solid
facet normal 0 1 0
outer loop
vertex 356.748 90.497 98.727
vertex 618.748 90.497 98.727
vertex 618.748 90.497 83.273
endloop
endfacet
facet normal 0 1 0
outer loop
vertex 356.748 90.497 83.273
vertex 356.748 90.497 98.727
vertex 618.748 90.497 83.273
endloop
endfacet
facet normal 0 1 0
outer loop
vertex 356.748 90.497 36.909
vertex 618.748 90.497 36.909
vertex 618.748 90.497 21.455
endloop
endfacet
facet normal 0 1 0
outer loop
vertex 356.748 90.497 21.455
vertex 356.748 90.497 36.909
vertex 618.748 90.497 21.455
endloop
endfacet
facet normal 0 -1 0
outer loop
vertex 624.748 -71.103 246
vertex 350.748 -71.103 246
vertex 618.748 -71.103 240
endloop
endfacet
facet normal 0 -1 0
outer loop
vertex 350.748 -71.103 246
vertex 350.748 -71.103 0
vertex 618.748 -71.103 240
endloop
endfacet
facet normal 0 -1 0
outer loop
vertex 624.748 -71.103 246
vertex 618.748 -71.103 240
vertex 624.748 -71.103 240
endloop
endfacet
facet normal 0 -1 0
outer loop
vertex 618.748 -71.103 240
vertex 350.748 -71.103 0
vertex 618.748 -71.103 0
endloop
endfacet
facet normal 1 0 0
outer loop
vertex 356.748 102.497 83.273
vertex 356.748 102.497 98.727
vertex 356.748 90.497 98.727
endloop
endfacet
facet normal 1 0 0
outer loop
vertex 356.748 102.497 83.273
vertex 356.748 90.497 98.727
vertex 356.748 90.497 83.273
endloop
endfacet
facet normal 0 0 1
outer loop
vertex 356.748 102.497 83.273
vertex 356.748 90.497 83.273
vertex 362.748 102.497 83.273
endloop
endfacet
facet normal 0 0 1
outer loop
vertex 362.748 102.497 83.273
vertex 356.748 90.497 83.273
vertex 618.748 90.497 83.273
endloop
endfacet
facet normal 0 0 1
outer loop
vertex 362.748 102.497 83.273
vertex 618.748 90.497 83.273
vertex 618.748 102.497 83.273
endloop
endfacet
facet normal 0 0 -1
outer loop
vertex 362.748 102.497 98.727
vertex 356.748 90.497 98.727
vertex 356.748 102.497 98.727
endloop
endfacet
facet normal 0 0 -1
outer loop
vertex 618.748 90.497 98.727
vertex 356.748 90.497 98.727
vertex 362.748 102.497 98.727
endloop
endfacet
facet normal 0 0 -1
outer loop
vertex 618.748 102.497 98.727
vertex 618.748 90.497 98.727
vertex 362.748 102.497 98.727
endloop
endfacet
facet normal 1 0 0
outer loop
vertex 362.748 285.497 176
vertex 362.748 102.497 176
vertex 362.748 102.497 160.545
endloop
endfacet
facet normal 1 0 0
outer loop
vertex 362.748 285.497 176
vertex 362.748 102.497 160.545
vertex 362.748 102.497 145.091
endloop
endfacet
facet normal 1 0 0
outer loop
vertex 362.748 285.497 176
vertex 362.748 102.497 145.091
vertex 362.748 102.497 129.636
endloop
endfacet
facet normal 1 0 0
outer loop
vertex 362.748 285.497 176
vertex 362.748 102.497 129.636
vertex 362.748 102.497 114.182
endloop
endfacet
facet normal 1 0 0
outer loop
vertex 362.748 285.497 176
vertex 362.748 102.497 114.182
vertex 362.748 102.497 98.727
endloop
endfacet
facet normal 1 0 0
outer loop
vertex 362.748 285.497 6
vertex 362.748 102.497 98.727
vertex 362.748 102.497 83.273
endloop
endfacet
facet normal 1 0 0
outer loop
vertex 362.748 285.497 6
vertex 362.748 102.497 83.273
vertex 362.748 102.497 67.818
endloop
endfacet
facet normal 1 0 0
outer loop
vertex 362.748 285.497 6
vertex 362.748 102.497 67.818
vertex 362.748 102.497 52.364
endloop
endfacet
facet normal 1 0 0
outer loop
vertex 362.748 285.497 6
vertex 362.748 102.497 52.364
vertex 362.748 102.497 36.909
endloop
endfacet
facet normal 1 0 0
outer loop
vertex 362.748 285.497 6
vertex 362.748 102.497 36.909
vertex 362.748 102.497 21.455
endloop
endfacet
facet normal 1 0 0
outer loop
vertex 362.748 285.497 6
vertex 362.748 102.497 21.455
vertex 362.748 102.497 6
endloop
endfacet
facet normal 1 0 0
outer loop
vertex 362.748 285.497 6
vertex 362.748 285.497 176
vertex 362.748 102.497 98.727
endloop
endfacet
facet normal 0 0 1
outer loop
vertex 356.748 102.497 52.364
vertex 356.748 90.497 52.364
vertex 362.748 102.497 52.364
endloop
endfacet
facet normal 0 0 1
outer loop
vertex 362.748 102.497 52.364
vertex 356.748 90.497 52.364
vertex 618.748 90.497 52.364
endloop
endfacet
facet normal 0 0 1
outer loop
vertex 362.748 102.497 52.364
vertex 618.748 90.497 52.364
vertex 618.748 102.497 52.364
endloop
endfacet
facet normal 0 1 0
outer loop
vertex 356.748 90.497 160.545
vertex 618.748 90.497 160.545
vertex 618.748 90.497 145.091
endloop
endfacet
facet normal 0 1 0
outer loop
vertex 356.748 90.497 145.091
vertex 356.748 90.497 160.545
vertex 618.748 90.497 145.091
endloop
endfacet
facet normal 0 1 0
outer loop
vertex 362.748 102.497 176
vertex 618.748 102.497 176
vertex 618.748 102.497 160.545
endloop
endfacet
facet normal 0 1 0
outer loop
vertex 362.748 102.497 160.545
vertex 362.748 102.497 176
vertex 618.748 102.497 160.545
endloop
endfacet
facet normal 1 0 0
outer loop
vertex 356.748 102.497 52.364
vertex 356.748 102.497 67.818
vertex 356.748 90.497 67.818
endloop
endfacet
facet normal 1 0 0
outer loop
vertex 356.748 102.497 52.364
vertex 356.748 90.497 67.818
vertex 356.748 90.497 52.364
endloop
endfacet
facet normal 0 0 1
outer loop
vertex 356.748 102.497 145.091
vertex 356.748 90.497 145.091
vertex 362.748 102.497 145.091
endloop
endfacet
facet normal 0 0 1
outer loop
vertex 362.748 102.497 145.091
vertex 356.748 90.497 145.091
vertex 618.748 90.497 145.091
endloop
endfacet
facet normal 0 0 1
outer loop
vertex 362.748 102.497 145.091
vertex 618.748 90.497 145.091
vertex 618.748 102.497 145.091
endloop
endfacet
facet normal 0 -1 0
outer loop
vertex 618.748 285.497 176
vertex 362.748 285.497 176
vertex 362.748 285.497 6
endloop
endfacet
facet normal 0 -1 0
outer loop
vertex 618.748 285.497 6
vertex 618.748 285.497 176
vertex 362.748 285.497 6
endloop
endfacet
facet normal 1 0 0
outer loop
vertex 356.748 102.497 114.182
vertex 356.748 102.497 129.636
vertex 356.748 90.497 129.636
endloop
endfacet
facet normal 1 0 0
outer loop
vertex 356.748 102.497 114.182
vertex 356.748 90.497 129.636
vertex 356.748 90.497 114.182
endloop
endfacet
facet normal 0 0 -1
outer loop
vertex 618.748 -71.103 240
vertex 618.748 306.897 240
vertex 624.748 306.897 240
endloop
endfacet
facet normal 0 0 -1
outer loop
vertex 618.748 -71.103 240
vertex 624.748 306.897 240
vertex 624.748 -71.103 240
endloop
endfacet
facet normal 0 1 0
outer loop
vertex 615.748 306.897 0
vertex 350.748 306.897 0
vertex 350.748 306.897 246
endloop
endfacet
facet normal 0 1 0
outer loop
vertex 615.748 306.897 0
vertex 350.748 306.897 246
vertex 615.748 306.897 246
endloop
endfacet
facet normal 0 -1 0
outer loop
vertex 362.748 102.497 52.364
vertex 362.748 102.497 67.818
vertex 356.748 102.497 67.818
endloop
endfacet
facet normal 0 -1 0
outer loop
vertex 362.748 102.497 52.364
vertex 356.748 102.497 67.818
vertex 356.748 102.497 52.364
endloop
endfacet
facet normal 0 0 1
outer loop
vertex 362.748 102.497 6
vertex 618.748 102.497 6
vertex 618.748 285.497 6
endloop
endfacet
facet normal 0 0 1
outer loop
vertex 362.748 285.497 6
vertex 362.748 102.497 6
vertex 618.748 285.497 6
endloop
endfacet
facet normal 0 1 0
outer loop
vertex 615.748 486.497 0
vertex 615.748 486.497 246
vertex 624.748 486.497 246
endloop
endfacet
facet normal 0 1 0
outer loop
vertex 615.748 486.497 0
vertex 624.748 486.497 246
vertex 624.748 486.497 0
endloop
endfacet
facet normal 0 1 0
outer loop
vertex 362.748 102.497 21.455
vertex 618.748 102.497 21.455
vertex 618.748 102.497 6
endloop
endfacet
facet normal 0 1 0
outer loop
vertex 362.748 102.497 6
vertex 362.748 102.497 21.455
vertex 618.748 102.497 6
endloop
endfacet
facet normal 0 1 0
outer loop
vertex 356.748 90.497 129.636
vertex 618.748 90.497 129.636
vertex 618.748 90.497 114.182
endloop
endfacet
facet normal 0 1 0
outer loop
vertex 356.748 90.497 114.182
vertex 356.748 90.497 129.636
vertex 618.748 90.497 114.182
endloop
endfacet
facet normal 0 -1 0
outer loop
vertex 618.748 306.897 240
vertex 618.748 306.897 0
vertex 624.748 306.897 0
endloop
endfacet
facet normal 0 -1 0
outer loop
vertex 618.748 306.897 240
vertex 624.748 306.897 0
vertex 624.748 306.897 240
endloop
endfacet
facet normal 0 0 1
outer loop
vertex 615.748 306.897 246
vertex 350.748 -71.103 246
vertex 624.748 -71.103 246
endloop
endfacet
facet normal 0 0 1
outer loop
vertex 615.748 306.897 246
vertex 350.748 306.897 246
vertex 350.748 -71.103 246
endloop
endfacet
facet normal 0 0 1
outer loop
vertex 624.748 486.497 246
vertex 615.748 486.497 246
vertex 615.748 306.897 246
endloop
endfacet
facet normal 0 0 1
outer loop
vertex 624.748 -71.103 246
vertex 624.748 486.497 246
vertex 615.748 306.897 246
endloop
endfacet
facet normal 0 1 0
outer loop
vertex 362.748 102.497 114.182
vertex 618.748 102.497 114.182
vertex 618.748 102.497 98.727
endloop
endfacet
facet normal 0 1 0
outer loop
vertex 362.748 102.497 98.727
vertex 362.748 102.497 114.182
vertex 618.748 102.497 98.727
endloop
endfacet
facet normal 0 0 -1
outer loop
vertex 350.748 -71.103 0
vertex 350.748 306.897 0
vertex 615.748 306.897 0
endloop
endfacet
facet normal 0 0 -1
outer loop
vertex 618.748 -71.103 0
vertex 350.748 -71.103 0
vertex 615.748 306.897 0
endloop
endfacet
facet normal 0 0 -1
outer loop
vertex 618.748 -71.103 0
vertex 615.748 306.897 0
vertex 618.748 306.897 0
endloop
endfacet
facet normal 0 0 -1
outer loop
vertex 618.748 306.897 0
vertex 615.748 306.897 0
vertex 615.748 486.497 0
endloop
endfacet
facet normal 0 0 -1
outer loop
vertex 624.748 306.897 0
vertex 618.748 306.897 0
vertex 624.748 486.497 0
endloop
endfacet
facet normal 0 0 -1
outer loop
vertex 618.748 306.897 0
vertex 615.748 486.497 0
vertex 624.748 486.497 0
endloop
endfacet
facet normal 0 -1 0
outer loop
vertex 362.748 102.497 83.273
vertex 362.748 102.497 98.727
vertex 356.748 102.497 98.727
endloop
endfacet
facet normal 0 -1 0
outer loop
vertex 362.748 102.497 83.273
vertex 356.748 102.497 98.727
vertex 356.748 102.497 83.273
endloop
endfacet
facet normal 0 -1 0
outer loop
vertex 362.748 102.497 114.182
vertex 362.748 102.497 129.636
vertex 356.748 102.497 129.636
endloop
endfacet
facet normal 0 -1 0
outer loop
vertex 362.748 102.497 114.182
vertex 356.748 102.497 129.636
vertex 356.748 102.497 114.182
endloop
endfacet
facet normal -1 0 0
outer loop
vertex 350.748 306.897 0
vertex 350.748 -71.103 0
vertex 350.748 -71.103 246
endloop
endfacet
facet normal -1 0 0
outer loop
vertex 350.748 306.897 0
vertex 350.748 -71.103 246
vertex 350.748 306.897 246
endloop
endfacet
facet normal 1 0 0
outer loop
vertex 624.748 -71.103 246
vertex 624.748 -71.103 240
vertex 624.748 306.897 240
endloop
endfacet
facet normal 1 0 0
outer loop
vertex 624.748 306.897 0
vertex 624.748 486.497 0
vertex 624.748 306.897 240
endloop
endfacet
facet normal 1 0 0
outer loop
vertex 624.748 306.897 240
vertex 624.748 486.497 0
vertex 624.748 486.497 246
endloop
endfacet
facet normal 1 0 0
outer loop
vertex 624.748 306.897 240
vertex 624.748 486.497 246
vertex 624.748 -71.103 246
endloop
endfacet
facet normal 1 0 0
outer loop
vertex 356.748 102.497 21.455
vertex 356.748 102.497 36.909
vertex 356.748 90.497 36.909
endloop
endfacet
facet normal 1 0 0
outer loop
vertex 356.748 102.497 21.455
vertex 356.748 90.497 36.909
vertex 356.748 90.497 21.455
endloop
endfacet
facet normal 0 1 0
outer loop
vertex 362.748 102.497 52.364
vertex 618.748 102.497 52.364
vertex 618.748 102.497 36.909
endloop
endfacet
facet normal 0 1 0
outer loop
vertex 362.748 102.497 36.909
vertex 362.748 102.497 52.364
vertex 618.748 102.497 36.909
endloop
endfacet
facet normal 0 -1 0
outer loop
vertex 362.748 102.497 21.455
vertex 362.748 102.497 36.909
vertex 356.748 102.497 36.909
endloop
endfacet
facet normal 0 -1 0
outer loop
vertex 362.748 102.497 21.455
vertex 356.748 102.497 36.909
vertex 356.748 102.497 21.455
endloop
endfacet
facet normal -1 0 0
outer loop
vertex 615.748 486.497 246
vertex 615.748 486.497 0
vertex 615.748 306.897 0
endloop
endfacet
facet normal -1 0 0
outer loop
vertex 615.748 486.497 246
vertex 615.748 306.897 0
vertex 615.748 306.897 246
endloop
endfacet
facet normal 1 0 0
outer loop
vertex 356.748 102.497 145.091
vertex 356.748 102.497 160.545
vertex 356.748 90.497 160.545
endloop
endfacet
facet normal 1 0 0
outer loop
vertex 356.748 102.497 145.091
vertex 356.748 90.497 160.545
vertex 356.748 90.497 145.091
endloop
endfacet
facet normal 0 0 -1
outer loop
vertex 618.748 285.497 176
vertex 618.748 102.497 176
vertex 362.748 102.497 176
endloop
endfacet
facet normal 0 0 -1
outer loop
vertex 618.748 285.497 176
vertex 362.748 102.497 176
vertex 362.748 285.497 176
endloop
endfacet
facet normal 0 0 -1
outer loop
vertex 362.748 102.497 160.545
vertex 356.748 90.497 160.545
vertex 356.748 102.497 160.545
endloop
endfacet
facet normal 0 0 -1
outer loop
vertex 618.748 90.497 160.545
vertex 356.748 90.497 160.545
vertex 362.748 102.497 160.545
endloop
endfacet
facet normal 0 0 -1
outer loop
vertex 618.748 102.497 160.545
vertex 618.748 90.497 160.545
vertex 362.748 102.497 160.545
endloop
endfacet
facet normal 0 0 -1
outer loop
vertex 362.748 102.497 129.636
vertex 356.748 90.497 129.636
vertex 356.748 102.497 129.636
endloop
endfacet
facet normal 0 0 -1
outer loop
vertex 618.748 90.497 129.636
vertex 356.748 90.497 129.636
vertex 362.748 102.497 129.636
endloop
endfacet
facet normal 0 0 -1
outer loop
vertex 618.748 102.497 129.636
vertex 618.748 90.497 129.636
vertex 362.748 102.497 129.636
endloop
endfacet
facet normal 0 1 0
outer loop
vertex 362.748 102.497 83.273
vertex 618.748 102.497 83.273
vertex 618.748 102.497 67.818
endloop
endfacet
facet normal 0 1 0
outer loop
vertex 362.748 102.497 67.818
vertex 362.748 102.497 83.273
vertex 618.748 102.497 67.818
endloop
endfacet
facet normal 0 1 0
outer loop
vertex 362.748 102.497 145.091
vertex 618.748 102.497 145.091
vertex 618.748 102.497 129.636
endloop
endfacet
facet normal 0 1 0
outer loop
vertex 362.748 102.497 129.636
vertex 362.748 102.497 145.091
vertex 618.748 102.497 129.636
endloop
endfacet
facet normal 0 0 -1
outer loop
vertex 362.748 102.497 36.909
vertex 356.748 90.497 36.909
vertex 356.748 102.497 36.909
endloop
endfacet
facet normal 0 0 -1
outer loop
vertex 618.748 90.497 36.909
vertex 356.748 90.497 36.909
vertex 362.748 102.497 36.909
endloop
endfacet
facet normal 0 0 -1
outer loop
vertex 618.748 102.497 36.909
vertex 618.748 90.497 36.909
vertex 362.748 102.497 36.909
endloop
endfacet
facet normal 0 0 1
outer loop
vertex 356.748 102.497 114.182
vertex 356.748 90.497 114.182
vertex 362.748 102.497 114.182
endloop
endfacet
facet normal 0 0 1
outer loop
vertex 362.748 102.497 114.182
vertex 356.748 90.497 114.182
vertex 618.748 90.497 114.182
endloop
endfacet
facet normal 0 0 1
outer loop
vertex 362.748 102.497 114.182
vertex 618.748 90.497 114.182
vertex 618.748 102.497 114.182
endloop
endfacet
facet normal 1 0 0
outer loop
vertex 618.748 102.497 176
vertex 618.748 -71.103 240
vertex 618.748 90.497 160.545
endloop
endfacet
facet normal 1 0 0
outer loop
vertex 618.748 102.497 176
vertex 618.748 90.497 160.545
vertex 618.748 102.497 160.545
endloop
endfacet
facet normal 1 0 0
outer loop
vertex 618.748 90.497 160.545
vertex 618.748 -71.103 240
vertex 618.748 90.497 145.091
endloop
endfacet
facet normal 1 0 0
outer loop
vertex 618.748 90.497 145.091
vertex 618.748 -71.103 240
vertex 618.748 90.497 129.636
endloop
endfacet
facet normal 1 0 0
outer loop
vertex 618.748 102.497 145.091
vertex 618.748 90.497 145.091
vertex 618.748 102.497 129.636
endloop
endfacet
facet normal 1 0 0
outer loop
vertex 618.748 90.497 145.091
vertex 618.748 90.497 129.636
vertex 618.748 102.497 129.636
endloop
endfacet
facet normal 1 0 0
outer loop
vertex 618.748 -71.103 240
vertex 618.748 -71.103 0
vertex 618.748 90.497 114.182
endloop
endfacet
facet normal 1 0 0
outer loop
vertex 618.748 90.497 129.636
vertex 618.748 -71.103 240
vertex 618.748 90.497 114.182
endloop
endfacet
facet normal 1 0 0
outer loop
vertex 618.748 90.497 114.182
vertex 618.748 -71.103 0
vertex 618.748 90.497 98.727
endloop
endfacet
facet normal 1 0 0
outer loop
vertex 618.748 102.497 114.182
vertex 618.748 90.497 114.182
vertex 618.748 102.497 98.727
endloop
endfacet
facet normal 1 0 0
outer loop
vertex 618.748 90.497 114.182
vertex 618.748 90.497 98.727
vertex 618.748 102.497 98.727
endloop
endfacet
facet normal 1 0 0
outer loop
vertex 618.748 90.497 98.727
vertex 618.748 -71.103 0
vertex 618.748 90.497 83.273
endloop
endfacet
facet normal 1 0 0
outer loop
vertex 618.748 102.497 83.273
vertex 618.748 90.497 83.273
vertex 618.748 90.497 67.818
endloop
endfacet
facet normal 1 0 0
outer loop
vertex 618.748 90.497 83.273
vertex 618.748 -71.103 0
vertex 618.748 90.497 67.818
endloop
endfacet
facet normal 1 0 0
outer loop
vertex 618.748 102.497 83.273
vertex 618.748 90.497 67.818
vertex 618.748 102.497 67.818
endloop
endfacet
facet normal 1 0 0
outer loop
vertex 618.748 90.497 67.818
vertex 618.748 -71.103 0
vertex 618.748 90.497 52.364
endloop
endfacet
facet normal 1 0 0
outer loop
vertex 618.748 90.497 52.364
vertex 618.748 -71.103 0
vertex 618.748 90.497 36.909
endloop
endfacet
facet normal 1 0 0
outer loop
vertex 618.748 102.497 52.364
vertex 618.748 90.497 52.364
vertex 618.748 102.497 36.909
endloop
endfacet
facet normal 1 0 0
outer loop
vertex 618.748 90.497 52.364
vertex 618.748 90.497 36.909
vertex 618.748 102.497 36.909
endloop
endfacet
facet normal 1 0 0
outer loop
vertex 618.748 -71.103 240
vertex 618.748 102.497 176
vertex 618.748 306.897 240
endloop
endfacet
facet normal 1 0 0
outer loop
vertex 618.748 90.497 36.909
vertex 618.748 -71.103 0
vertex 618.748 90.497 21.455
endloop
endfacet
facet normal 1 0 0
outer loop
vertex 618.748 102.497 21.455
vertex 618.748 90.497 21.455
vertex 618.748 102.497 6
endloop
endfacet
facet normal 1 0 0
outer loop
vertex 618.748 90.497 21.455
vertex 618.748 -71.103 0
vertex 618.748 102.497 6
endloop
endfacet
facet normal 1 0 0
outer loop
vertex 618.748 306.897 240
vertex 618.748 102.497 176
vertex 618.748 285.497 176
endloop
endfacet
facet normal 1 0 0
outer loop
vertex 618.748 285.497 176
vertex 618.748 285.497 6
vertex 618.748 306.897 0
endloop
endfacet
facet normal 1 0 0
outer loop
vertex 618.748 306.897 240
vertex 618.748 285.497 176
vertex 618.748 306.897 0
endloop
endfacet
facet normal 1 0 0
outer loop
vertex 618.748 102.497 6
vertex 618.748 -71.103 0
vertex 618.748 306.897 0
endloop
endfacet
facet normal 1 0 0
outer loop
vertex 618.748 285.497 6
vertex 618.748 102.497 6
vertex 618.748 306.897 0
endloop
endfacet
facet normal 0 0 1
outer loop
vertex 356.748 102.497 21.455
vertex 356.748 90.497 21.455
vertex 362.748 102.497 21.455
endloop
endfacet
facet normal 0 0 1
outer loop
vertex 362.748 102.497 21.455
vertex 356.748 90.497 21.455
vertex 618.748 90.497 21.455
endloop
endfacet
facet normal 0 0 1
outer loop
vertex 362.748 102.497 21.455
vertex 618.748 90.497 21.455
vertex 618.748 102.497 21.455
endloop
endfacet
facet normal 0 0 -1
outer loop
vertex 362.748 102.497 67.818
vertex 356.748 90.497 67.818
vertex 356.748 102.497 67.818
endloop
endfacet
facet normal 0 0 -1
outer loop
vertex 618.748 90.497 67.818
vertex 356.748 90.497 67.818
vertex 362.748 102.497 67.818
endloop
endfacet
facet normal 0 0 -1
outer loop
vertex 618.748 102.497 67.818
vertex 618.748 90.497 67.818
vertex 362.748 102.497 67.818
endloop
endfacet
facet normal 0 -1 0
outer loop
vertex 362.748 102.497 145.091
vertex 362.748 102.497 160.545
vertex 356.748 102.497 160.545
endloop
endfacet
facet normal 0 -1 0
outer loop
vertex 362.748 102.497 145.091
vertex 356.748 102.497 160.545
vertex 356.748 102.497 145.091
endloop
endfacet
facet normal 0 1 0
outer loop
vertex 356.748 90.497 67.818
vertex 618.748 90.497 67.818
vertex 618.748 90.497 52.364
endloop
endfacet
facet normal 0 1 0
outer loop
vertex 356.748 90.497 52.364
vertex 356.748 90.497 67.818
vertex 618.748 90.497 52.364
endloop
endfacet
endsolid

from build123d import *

# Parameters (mm, degrees)
SKETCH_1_W             = 268
SKETCH_1_H             = 378
EXTRUDE_1_DEPTH        = 246
SKETCH_2_W             = 170
SKETCH_2_H             = 183
CUT_EXTRUDE_1_DEPTH    = 256
EXTRUDE_4_DEPTH        = 6
EXTRUDE_4_DEPTH_BACK   = 3
SKETCH_8_W             = 15.454545454
SKETCH_8_H             = 12
CUT_EXTRUDE_2_DEPTH    = 262
PATTERN_LINEAR_1_COUNT = 5
PATTERN_LINEAR_1_PITCH = 30.909090909


with BuildPart() as part:
    # Эскиз1 → Бобышка-Вытянуть1 (new body)
    with BuildSketch(Plane.XY):
        with Locations((484.747616564, 117.897162102)):
            Rectangle(SKETCH_1_W, SKETCH_1_H)
    extrude(amount=EXTRUDE_1_DEPTH)

    # Эскиз2 → Вырез-Вытянуть1 (cut)
    with BuildSketch(Plane(origin=(618.747616564, 0, 0), x_dir=(0, 0, -1), z_dir=(1, 0, 0))):
        with Locations((-91, 193.997162102)):
            Rectangle(SKETCH_2_W, SKETCH_2_H)
    extrude(amount=-CUT_EXTRUDE_1_DEPTH, mode=Mode.SUBTRACT)

    # Эскиз7 → Бобышка-Вытянуть4 (add, two sides: drawn at the far end of the back side and taken through both)
    with BuildSketch(Plane(origin=(618.747616564, 0, 0), x_dir=(0, 0, -1), z_dir=(1, 0, 0)).offset(-EXTRUDE_4_DEPTH_BACK)):
        Polygon((-240, -71.102837898), (-246, -71.102837898), (-246, 486.497162102), (0, 486.497162102), (0, 306.897162102), (-240, 306.897162102), align=None)
    extrude(amount=EXTRUDE_4_DEPTH + EXTRUDE_4_DEPTH_BACK)

    # Эскиз8 → Вырез-Вытянуть2 (cut)
    with BuildSketch(Plane(origin=(618.747616564, 0, 0), x_dir=(0, 0, -1), z_dir=(1, 0, 0))):
        with Locations((-152.818181818, 96.497162102)):
            Rectangle(SKETCH_8_W, SKETCH_8_H)
    cut_extrude_2 = extrude(amount=-CUT_EXTRUDE_2_DEPTH, mode=Mode.SUBTRACT)

    # Линейный массив1: Вырез-Вытянуть2 ×5
    with Locations(*[(0, 0, -i * PATTERN_LINEAR_1_PITCH) for i in range(1, PATTERN_LINEAR_1_COUNT)]):
        add(cut_extrude_2, mode=Mode.SUBTRACT)


solid = part.part
